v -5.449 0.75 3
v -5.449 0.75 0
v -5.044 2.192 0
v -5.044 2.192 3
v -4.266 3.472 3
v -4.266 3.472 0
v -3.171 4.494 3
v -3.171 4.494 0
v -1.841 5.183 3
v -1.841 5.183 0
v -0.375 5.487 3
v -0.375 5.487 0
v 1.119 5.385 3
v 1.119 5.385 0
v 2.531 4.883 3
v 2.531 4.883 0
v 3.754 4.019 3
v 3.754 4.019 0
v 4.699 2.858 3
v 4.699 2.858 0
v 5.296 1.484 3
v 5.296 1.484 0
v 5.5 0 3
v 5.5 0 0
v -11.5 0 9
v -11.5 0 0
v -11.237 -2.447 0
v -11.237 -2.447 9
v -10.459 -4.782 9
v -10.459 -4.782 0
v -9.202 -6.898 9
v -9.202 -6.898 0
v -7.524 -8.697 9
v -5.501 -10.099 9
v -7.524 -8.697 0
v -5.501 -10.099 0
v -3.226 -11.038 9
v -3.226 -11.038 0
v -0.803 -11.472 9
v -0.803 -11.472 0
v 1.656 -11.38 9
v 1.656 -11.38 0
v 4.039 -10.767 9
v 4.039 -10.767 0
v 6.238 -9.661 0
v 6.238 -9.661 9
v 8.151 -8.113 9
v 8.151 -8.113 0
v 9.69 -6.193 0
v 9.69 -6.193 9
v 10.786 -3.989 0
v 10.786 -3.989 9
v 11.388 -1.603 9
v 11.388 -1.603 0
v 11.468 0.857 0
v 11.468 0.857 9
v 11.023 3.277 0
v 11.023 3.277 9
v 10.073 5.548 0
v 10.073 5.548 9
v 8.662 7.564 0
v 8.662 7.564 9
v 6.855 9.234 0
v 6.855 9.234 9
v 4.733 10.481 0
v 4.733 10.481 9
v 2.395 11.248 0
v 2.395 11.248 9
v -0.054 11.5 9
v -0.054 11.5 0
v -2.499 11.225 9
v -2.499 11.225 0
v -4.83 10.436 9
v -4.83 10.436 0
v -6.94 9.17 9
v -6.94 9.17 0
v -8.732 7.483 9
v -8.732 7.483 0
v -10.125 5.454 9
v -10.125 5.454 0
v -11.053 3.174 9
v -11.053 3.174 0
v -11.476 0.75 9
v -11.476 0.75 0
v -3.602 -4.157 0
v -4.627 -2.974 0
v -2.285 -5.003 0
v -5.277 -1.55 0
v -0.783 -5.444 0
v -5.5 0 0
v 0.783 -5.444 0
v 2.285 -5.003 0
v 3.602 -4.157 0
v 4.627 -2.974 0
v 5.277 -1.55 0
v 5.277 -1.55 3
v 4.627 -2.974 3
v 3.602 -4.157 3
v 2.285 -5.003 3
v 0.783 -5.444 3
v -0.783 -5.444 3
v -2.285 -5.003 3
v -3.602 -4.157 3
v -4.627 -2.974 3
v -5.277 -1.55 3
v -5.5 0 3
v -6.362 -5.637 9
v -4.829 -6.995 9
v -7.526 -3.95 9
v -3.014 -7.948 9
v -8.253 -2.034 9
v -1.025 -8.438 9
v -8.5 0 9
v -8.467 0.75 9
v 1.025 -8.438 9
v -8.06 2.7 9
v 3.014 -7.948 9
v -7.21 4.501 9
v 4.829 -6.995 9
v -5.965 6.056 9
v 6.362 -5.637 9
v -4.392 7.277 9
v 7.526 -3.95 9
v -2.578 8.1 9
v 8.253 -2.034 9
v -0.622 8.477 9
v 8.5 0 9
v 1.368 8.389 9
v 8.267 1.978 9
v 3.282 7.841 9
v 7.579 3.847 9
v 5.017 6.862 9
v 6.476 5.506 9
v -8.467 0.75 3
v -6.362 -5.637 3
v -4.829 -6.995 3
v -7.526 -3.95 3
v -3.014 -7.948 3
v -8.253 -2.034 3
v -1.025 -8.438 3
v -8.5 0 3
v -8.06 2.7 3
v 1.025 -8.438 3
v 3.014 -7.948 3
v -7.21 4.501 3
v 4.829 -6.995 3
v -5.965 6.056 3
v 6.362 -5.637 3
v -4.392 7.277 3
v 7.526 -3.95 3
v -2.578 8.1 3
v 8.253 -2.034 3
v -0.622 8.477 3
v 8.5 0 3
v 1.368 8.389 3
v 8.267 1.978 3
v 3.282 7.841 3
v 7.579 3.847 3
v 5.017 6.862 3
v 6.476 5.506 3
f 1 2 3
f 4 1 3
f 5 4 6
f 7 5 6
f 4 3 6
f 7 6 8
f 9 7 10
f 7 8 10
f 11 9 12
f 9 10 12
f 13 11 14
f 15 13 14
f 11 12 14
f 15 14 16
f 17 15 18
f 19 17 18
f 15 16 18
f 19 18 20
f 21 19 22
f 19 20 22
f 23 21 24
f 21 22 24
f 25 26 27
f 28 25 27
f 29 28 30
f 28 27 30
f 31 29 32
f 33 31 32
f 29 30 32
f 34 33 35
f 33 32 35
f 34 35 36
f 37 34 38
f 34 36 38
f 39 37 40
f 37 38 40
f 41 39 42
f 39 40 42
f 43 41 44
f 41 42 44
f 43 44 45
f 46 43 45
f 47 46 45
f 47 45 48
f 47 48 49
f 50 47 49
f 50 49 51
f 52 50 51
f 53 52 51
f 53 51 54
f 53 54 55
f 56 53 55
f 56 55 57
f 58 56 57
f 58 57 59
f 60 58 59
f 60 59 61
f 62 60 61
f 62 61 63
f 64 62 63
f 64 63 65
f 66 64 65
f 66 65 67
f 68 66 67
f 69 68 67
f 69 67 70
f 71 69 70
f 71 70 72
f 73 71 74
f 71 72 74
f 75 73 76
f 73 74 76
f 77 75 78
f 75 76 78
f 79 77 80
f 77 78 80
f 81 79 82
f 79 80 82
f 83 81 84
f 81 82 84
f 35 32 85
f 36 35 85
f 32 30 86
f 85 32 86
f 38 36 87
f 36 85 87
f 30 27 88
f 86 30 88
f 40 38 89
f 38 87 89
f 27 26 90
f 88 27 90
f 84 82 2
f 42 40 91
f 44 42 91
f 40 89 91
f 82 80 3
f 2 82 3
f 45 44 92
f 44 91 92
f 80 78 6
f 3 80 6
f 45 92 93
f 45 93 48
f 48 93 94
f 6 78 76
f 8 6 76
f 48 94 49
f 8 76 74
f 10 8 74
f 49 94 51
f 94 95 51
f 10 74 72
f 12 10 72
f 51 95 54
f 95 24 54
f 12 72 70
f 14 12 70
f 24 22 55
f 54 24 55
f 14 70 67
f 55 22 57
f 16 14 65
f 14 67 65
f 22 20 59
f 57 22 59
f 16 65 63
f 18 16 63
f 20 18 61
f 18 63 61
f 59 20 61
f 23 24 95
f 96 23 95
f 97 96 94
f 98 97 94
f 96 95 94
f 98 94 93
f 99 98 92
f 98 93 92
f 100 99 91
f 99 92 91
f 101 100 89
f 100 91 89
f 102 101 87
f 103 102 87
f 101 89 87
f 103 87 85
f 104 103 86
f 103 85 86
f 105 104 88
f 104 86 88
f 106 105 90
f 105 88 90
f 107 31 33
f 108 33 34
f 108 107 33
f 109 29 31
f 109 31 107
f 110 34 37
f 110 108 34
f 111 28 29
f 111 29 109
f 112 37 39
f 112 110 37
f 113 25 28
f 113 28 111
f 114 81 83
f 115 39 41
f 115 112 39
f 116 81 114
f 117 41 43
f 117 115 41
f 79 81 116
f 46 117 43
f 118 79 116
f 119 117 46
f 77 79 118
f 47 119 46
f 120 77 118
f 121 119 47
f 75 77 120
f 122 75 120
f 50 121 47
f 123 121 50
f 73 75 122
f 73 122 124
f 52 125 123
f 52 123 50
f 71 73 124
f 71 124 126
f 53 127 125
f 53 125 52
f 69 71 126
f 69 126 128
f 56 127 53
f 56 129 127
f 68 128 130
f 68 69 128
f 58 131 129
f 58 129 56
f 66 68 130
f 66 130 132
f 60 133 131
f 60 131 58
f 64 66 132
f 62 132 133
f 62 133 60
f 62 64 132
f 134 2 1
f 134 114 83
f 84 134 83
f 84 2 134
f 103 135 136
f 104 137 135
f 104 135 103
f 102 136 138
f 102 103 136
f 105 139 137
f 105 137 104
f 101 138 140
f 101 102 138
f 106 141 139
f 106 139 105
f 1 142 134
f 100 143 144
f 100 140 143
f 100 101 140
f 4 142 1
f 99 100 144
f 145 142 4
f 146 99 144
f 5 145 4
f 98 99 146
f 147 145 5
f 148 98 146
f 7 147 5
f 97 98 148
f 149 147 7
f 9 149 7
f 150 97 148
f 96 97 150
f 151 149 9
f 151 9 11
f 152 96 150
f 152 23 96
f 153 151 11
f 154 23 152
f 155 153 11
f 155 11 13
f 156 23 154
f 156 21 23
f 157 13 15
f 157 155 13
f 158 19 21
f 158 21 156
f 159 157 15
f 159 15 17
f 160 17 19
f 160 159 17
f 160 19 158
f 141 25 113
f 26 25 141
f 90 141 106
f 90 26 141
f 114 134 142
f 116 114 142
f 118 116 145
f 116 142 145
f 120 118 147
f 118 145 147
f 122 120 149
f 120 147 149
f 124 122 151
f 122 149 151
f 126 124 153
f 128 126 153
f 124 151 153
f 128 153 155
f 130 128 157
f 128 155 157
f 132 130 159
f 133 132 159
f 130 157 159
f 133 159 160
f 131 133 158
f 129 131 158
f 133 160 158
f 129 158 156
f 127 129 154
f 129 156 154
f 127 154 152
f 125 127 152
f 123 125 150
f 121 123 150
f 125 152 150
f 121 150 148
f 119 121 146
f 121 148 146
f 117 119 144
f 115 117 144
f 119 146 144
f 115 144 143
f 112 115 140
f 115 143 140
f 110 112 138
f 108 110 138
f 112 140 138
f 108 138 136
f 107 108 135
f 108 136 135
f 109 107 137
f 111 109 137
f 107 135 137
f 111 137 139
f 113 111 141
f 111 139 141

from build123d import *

# Parameters (mm, degrees)
F1_DEPTH = 3
F2_DEPTH = 9
F3_DEPTH = 9.001


with BuildPart() as f1:
    # F0 (on Top) → F1 (new body)
    with BuildSketch(Plane.XY):
        with BuildLine():
            Line((-5.4486236794, 0.75), (-8.4668471109, 0.75))
            ThreePointArc((-8.4668471109, 0.75), (-8.4917077329, 0.3753661926), (-8.5, 0))
            Line((-8.5, 0), (-5.5, 0))
            ThreePointArc((-5.5, 0), (-5.4871408874, 0.3758788124), (-5.4486236794, 0.75))
        make_face()
        with BuildLine():
            ThreePointArc((-8.5, 0), (0, -8.5), (8.5, 0))
            ThreePointArc((8.5, 0), (0.3753661926, 8.4917077329), (-8.4668471109, 0.75))
            Line((-8.4668471109, 0.75), (-5.4486236794, 0.75))
            ThreePointArc((-5.4486236794, 0.75), (0.3758788124, 5.4871408874), (5.5, 0))
            ThreePointArc((5.5, 0), (0, -5.5), (-5.5, 0))
            Line((-5.5, 0), (-8.5, 0))
        make_face()
        with BuildLine():
            ThreePointArc((-8.5, 0), (-8.4917077329, 0.3753661926), (-8.4668471109, 0.75))
            Line((-8.4668471109, 0.75), (-11.4755174175, 0.75))
            ThreePointArc((-11.4755174175, 0.75), (-11.4938777247, 0.3751997458), (-11.5, 0))
            Line((-11.5, 0), (-8.5, 0))
        make_face()
        with BuildLine():
            ThreePointArc((-8.4668471109, 0.75), (0.3753661926, 8.4917077329), (8.5, 0))
            ThreePointArc((8.5, 0), (0, -8.5), (-8.5, 0))
            Line((-8.5, 0), (-11.5, 0))
            ThreePointArc((-11.5, 0), (0, -11.5), (11.5, 0))
            ThreePointArc((11.5, 0), (0.3751997458, 11.4938777247), (-11.4755174175, 0.75))
            Line((-11.4755174175, 0.75), (-8.4668471109, 0.75))
        make_face()
    extrude(amount=F1_DEPTH)

    # F0 (on Top) → F2 (join)
    with BuildSketch(Plane.XY):
        with BuildLine():
            ThreePointArc((-8.5, 0), (-8.4917077329, 0.3753661926), (-8.4668471109, 0.75))
            Line((-8.4668471109, 0.75), (-11.4755174175, 0.75))
            ThreePointArc((-11.4755174175, 0.75), (-11.4938777247, 0.3751997458), (-11.5, 0))
            Line((-11.5, 0), (-8.5, 0))
        make_face()
        with BuildLine():
            ThreePointArc((-8.4668471109, 0.75), (0.3753661926, 8.4917077329), (8.5, 0))
            ThreePointArc((8.5, 0), (0, -8.5), (-8.5, 0))
            Line((-8.5, 0), (-11.5, 0))
            ThreePointArc((-11.5, 0), (0, -11.5), (11.5, 0))
            ThreePointArc((11.5, 0), (0.3751997458, 11.4938777247), (-11.4755174175, 0.75))
            Line((-11.4755174175, 0.75), (-8.4668471109, 0.75))
        make_face()
    extrude(amount=F2_DEPTH)

    # F0 (on Top) → F3 (cut, through all)
    with BuildSketch(Plane.XY):
        with BuildLine():
            Line((-5.4486236794, 0.75), (-8.4668471109, 0.75))
            ThreePointArc((-8.4668471109, 0.75), (-8.4917077329, 0.3753661926), (-8.5, 0))
            Line((-8.5, 0), (-5.5, 0))
            ThreePointArc((-5.5, 0), (-5.4871408874, 0.3758788124), (-5.4486236794, 0.75))
        make_face()
        with BuildLine():
            ThreePointArc((-8.5, 0), (-8.4917077329, 0.3753661926), (-8.4668471109, 0.75))
            Line((-8.4668471109, 0.75), (-11.4755174175, 0.75))
            ThreePointArc((-11.4755174175, 0.75), (-11.4938777247, 0.3751997458), (-11.5, 0))
            Line((-11.5, 0), (-8.5, 0))
        make_face()
    extrude(amount=F3_DEPTH, mode=Mode.SUBTRACT)


solid = f1.part
